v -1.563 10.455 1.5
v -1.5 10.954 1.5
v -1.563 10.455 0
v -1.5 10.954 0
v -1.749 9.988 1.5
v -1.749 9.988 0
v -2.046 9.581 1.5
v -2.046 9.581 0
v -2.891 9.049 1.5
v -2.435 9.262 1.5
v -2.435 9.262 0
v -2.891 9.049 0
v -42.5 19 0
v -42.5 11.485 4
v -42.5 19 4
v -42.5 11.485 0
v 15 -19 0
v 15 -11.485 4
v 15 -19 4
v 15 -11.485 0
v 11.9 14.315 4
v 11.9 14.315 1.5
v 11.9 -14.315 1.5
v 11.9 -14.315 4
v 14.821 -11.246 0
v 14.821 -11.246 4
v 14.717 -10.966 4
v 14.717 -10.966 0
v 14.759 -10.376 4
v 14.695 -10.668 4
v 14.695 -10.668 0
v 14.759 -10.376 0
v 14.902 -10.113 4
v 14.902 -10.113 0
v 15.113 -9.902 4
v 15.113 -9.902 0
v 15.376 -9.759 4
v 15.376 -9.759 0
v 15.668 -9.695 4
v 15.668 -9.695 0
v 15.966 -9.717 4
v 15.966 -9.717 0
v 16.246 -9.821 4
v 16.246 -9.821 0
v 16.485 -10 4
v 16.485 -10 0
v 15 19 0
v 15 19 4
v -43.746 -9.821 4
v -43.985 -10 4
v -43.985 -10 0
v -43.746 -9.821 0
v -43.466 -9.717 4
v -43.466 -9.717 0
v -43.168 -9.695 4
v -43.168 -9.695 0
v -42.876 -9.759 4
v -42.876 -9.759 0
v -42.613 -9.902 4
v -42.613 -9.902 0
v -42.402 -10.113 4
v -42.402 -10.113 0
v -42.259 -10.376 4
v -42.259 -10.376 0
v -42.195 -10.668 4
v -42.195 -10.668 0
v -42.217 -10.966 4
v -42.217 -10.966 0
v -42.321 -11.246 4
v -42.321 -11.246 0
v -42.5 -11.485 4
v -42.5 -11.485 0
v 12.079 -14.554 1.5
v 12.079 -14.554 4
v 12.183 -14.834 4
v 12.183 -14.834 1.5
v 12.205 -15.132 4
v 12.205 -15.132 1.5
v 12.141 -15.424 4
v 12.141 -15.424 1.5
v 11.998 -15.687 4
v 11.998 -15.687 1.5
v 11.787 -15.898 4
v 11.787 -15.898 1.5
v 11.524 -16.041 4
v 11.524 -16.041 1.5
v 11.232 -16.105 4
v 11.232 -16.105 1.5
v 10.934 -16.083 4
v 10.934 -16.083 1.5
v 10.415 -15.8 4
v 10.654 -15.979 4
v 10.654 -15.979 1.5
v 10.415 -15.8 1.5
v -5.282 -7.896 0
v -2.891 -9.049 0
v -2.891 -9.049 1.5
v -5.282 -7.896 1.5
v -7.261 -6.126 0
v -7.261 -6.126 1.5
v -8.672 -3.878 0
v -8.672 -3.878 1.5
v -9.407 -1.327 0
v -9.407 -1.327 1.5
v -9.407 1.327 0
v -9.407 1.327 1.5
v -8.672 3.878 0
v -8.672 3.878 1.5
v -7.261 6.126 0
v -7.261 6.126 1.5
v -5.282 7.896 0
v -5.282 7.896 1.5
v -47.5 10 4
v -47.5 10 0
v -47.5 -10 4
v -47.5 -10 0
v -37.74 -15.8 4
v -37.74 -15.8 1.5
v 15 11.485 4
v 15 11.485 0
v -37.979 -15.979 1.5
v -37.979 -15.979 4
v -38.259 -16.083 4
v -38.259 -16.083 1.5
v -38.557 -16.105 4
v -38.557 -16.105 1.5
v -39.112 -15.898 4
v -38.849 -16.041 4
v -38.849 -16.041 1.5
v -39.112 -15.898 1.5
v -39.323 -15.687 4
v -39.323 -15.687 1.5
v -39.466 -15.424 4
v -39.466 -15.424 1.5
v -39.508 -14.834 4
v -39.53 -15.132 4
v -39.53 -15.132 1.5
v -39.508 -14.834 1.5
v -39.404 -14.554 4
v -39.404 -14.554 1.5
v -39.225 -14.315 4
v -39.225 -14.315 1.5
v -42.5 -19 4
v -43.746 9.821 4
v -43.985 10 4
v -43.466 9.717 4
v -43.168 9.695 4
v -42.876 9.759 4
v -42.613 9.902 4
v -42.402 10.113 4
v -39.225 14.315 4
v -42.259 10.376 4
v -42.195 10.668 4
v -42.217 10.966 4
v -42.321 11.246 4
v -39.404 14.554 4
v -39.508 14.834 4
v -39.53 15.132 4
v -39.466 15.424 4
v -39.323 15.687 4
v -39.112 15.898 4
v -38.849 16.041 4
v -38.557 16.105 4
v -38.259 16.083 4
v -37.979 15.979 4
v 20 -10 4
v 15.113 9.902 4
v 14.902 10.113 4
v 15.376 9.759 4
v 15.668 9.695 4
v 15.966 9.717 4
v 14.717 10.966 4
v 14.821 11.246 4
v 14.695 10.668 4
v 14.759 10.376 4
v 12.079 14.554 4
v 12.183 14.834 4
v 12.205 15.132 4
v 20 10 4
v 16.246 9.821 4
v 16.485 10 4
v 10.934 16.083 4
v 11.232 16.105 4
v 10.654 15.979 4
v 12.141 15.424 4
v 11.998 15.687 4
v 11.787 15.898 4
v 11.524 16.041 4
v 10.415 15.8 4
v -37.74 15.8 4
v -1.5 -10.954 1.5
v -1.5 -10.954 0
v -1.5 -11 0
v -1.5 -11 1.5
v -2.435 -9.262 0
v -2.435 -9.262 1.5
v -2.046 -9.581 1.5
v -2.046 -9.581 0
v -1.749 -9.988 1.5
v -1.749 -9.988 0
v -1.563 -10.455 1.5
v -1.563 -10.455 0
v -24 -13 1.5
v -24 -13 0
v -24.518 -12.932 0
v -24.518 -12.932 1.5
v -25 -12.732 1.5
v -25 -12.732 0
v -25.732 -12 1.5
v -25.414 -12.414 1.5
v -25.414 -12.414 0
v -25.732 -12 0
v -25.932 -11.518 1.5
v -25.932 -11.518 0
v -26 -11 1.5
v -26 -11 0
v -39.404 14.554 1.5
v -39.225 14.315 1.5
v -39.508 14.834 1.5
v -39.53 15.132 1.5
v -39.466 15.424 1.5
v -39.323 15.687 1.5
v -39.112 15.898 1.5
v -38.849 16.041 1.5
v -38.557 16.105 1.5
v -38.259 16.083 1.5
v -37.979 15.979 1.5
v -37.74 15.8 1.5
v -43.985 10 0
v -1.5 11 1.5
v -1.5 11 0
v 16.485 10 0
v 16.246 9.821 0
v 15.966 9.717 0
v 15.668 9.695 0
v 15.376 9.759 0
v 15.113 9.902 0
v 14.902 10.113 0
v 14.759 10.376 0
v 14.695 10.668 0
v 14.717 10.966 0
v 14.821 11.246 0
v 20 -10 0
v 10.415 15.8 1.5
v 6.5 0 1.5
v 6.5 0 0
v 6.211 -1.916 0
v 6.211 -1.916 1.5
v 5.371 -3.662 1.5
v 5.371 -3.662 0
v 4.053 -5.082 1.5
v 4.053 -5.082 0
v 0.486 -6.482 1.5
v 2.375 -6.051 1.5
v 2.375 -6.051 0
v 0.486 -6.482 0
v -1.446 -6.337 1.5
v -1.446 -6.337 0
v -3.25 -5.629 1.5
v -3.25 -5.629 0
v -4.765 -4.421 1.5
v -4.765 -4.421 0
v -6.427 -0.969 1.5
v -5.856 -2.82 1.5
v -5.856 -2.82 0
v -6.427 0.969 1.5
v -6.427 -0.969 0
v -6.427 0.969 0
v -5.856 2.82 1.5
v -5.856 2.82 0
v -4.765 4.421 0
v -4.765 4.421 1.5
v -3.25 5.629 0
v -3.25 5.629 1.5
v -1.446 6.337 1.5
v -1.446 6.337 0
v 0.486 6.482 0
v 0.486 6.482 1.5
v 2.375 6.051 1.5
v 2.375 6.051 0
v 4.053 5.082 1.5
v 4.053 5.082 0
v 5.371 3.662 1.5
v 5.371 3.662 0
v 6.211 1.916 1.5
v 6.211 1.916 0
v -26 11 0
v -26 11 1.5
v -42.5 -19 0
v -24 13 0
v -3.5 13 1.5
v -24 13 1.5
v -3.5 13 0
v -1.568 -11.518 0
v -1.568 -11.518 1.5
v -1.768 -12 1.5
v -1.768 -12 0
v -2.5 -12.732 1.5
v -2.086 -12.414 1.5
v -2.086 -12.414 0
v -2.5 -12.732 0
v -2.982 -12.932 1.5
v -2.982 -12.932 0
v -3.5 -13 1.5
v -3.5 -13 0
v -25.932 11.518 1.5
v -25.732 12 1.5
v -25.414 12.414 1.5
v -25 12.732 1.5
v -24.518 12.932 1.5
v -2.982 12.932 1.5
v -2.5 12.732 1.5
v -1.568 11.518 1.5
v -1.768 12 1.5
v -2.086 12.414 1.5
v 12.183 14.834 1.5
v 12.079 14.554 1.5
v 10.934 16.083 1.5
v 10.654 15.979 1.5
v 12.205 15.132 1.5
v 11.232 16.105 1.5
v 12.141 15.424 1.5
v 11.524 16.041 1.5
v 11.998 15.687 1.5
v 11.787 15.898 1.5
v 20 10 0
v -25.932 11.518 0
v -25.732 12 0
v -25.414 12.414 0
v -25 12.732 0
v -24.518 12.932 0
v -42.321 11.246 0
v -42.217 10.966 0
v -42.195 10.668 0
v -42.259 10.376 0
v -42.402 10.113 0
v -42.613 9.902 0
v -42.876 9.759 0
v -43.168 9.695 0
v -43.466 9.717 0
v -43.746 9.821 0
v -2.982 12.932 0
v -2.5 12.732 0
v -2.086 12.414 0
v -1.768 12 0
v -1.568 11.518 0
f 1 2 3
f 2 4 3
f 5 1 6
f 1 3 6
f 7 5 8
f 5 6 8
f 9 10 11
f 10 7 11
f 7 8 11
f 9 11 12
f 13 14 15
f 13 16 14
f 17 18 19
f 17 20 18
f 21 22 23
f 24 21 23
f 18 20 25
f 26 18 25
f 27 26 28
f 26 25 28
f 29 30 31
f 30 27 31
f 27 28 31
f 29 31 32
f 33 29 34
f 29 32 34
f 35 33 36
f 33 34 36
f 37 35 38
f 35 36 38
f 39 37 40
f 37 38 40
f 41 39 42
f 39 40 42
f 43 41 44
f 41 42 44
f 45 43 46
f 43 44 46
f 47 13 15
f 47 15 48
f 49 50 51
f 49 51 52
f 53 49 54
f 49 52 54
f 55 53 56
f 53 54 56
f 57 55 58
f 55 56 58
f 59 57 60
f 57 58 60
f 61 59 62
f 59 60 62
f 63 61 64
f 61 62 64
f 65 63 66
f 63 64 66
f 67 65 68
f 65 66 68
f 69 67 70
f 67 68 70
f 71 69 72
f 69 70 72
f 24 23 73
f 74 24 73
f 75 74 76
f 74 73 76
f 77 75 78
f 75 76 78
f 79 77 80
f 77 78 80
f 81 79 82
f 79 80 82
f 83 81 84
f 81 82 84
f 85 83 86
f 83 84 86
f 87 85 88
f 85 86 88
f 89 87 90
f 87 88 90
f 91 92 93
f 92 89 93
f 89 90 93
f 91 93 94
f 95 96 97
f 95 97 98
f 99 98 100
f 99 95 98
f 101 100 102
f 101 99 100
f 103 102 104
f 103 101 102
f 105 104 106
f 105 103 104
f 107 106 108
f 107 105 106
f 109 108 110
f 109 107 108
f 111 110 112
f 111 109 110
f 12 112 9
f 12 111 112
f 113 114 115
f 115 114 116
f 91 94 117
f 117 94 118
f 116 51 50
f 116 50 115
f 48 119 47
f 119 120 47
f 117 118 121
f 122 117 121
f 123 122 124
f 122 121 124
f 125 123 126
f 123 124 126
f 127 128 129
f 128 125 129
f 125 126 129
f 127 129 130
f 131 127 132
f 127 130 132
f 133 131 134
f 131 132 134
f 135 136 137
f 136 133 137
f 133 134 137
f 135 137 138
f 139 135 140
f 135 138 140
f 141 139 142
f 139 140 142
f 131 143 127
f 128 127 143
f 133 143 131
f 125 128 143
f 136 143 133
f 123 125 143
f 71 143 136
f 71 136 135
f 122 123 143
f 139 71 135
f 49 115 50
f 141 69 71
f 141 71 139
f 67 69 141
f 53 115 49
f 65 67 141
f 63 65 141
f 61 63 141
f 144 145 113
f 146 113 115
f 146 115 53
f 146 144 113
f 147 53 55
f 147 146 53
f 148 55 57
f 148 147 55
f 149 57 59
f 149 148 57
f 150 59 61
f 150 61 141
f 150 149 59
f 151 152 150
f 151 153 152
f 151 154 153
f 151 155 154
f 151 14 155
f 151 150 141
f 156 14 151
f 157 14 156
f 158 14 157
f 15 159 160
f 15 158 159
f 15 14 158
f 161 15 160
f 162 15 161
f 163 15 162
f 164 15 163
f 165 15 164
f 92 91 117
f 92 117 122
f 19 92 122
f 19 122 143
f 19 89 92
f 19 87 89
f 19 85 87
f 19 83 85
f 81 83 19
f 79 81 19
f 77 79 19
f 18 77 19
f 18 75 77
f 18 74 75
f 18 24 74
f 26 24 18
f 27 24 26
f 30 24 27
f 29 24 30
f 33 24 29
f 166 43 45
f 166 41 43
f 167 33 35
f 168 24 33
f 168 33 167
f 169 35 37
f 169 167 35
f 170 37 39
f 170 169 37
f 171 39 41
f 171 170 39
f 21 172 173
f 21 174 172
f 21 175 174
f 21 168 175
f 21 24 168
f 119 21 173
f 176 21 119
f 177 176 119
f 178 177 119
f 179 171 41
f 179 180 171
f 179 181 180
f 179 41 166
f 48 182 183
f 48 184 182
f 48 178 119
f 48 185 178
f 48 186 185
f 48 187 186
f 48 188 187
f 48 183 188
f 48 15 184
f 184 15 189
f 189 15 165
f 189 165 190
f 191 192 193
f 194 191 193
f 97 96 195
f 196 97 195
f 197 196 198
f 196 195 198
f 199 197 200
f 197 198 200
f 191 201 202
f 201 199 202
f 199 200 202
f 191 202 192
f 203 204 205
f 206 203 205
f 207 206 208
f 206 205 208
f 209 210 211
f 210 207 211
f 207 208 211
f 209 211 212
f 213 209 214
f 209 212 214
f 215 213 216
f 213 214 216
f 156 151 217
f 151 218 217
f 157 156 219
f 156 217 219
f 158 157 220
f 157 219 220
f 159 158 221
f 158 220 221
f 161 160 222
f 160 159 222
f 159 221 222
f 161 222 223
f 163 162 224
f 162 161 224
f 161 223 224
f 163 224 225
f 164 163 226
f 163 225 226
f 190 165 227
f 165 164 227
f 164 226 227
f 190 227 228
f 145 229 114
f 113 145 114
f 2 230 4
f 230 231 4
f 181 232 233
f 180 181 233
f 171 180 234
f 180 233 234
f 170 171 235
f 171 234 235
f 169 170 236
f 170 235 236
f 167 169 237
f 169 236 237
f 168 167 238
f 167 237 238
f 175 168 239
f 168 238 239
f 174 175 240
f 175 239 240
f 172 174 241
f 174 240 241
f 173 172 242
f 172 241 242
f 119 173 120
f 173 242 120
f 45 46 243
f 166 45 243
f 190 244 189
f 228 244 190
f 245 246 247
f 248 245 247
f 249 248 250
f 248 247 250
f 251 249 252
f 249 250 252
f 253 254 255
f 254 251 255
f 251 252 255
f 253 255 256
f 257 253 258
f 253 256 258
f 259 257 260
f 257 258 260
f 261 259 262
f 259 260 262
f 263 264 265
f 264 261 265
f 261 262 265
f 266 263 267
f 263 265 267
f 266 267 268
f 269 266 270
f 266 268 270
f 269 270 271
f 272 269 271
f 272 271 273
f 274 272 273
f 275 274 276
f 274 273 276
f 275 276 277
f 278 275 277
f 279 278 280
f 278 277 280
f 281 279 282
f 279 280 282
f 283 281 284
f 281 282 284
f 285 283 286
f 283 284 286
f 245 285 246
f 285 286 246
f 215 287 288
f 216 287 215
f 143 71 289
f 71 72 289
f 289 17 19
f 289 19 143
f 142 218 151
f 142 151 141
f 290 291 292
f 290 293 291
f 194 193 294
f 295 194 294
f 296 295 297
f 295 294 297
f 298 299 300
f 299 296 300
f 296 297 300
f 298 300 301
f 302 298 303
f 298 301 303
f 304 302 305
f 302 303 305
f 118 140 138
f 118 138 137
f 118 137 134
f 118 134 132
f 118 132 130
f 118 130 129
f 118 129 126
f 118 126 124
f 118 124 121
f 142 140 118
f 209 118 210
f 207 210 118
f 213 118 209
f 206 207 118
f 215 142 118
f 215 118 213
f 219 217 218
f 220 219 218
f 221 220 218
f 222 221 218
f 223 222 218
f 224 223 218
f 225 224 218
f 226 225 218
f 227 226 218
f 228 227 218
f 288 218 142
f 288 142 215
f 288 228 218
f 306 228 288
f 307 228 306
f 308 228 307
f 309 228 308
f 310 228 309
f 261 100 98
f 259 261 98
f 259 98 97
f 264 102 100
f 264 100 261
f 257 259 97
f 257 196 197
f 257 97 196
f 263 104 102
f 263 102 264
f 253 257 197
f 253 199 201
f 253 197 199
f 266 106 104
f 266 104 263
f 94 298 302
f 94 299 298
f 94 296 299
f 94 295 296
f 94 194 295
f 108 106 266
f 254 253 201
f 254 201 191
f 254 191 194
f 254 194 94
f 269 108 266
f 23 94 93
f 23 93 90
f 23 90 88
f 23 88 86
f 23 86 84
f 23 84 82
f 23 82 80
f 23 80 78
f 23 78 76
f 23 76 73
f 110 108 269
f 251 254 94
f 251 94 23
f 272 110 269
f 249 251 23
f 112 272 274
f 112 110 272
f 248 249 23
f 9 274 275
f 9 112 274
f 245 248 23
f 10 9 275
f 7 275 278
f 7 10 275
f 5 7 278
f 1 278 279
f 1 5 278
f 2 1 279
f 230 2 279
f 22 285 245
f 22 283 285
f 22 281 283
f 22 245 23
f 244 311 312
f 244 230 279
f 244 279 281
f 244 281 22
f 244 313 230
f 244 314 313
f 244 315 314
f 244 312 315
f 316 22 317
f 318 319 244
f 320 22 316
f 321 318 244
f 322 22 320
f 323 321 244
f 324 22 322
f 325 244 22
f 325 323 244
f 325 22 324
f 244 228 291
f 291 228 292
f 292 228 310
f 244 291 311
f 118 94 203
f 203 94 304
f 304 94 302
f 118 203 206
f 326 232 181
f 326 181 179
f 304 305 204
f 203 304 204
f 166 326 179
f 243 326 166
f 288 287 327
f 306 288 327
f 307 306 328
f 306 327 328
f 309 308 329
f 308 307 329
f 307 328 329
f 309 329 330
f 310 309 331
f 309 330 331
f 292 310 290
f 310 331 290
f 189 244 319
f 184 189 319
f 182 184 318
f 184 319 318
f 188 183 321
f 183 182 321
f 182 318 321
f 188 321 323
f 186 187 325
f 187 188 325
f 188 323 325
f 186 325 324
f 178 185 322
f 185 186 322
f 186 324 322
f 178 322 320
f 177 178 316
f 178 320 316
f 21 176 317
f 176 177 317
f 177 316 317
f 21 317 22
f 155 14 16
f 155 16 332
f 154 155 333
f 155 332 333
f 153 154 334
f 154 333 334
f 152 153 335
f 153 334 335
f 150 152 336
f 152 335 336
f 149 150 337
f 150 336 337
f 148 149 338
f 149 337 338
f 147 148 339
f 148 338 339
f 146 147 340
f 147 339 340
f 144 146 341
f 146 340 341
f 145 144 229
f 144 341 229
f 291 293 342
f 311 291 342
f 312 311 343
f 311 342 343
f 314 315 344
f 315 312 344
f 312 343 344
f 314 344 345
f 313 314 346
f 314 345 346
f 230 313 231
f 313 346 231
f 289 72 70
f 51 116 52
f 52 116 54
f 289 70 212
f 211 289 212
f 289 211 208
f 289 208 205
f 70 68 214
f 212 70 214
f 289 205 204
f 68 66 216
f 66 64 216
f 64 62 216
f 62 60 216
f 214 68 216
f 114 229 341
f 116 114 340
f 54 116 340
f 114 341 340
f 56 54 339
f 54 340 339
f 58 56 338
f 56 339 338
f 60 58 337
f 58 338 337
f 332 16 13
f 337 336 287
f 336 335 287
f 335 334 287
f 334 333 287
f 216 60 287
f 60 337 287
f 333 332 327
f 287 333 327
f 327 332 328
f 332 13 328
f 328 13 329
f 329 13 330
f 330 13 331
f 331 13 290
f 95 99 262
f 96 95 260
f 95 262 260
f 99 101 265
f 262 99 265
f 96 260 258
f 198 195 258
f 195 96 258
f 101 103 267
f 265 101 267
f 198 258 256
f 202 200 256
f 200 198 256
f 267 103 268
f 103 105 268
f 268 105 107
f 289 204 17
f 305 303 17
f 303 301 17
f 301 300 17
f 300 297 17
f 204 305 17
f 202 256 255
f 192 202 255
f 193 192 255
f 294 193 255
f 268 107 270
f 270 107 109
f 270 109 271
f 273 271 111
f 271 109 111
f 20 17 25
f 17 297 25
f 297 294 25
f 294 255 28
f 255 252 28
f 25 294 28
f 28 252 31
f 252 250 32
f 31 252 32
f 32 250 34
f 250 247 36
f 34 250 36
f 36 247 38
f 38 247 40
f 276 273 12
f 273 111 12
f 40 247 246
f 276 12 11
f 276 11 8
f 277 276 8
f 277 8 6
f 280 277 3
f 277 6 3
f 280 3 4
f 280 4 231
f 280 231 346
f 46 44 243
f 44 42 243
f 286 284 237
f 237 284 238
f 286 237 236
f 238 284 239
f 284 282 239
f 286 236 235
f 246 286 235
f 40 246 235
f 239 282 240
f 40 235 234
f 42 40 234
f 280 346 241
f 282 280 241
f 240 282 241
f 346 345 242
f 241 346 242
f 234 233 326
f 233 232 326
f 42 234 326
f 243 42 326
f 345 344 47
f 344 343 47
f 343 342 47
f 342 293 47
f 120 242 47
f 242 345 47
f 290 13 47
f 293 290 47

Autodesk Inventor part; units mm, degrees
ref_plane "YZ Plane" through (0, 0, 0) normal (1, 0, 0) x (0, 1, 0)
ref_plane "XZ Plane" through (0, 0, 0) normal (0, 1, 0) x (-1, 0, 0)
ref_plane "XY Plane" through (0, 0, 0) normal (0, 0, 1) x (1, 0, 0)
sketch "スケッチ1" plane through (0, 0, 0) normal (0, 0, 1) x (1, 0, 0)
  line L0 (12, 16) -> (-29, 16) construction
  line L1 (-31, 14) -> (-31, -14) construction
  line L2 (-29, -16) -> (12, -16) construction
  line L3 (12, -16) -> (12, 16) construction
  line L4 (12, 16) -> (-31, -16) construction
  line L5 (-31, 16) -> (12, -16) construction
  line L6 (12, 0) -> (-31, 0) construction
  circle A0 centre (0, 0) radius 10.5 construction
  arc A1 (12, 10.583) -> (0, 16) centre (0, 0) ccw construction
  line L7 (-39.5, 14.4) -> (-39.5, -14.4) construction
  arc A2 (-29, 16) -> (-31, 14) centre (-29, 14) ccw construction
  arc A3 (-31, -14) -> (-29, -16) centre (-29, -14) ccw construction
  line L8 (-39.5, 14.4) -> (-30.9596, 14.4) construction
  line L9 (-39.5, -14.4) -> (-30.9596, -14.4) construction
  line L10 (-1, 13.5) -> (-28, 13.5) construction
  line L11 (-28, 13.5) -> (-28, -13.5) construction
  line L12 (-28, -13.5) -> (-1, -13.5) construction
  line L13 (-1, -13.5) -> (-1, 13.5) construction
  line L14 (-1, 13.5) -> (-28, -13.5) construction
  line L15 (-28, 13.5) -> (-1, -13.5) construction
  circle A4 centre (-1, 13.5) radius 1.35 construction
  circle A5 centre (-28, 13.5) radius 1.35 construction
  circle A6 centre (-1, -13.5) radius 1.35 construction
  circle A7 centre (-28, -13.5) radius 1.35 construction
  arc A8 (0, -16) -> (12, -10.583) centre (0, 0) ccw construction
  line L16 (11.9, 15.8) -> (11.9, 14.3151) construction
  line L17 (11.9, 15.8) -> (10.4151, 15.8) construction
  line L18 (-39.225, 15.8) -> (-39.225, 14.3151) construction
  arc A9 (-37.7401, 15.8) -> (-39.225, 14.3151) centre (-38.4825, 15.0575) ccw
  line L19 (11.9, -15.8) -> (10.4151, -15.8) construction
  arc A10 (-39.225, -14.3151) -> (-37.7401, -15.8) centre (-38.4825, -15.0575) ccw
  line L20 (-42.5, 19) -> (15, 19)
  line L21 (15, 19) -> (15, -19) construction
  line L22 (15, -19) -> (-42.5, -19)
  line L23 (-42.5, -19) -> (-42.5, 19) construction
  line L24 (-42.5, 19) -> (15, -19) construction
  line L25 (15, 19) -> (-42.5, -19) construction
  line L26 (15, 10) -> (16.4849, 10) construction
  line L27 (20, 10) -> (20, -10)
  line L28 (15, -10) -> (16.4849, -10) construction
  arc A11 (15, 11.4849) -> (16.4849, 10) centre (15.7425, 10.7425) ccw
  arc A12 (16.4849, -10) -> (15, -11.4849) centre (15.7425, -10.7425) ccw
  line L29 (-13.75, 19) -> (-13.75, -19) construction
  line L30 (15, 11.4849) -> (15, 19)
  line L31 (15, -11.4849) -> (15, -19)
  line L32 (-42.5, 10) -> (-43.9849, 10) construction
  line L33 (-47.5, 10) -> (-47.5, -10)
  line L34 (-42.5, -10) -> (-43.9849, -10) construction
  arc A13 (-43.9849, 10) -> (-42.5, 11.4849) centre (-43.2425, 10.7425) ccw
  arc A14 (-42.5, -11.4849) -> (-43.9849, -10) centre (-43.2425, -10.7425) ccw
  line L35 (-42.5, 11.4849) -> (-42.5, 19)
  line L36 (-42.5, -11.4849) -> (-42.5, -19)
  circle A15 centre (0, 0) radius 6 construction
  circle A16 centre (0, 0) radius 6.5
  line L37 (-3.5, 13) -> (-24, 13)
  line L38 (-26, 11) -> (-26, -11)
  line L39 (-3.5, -13) -> (-24, -13)
  arc A17 (-24, 13) -> (-26, 11) centre (-24, 11) ccw
  arc A18 (-26, -11) -> (-24, -13) centre (-24, -11) ccw
  line L40 (-1.5, 11) -> (-1.5, 10.9545)
  arc A19 (-2.8913, 9.0493) -> (-2.8913, -9.0493) centre (0, 0) ccw
  line L41 (-1.5, -10.9545) -> (-1.5, -11)
  arc A20 (-1.5, 11) -> (-3.5, 13) centre (-3.5, 11) ccw
  arc A21 (-3.5, -13) -> (-1.5, -11) centre (-3.5, -11) ccw
  arc A22 (-1.5, -10.9545) -> (-2.8913, -9.0493) centre (-3.5, -10.9545) ccw
  arc A23 (-2.8913, 9.0493) -> (-1.5, 10.9545) centre (-3.5, 10.9545) ccw
  arc A24 (11.9, 14.3151) -> (10.4151, 15.8) centre (11.1575, 15.0575) ccw
  arc A25 (10.4151, -15.8) -> (11.9, -14.3151) centre (11.1575, -15.0575) ccw
  line L42 (10.4151, 15.8) -> (-37.7401, 15.8)
  line L43 (11.9, 14.3151) -> (11.9, -14.3151)
  line L44 (10.4151, -15.8) -> (-37.7401, -15.8)
  line L45 (11.9, -14.3151) -> (11.9, -15.8) construction
  line L46 (-37.7401, -15.8) -> (-39.225, -15.8) construction
  line L47 (-39.225, -14.3151) -> (-39.225, -15.8) construction
  line L48 (-37.7401, 15.8) -> (-39.225, 15.8) construction
  line L49 (-39.225, 14.3151) -> (-39.225, -14.3151)
  line L50 (16.4849, 10) -> (20, 10)
  line L51 (16.4849, -10) -> (20, -10)
  line L52 (-43.9849, -10) -> (-47.5, -10)
  line L53 (-43.9849, 10) -> (-47.5, 10)
  point P0 (-9.5, 0)
  point P1 (-14.5, 0)
  point P2 (-13.75, 0)
  point P3 (-39.225, -14.3151)
  point P4 (-43.9849, -10)
  point P5 (-1.5, 13)
  point P6 (-26, 13)
  point P7 (-1.5, -13)
  point P8 (-26, -13)
  point P9 (-1.5, -13)
  point P10 (-1.5, 13)
  point P11 (-1.5, 9.3808)
  point P12 (-1.5, -9.3808)
  point P13 (11.9, -14.3151)
  point P14 (10.4151, -15.8)
  dimension "d0" = 43
  dimension "d1" = 32
  dimension "d2" = 21
  dimension "d3" = 16
  dimension "d4" = 9.5
  dimension "d5" = 28.8
  dimension "d7" = 2
  dimension "d8" = 8.5
  dimension "d9" = 27
  dimension "d10" = 27
  dimension "d11" = 8.5
  dimension "d12" = 2.7
  dimension "d13" = 2.7
  dimension "d23" = 3
  dimension "d24" = 3
  dimension "d26" = 5
  dimension "d27" = 20
  dimension "d29" = 1.05
  dimension "d34" = 12
  dimension "d35" = 13
  dimension "d36" = 38
  dimension "d39" = 5
  dimension "d40" = 2
  dimension "d43" = 3
  dimension "d44" = 3
  dimension "d45" = 1.5
  dimension "d46" = 2
  dimension "d47" = 2
  dimension "d54" = 51.125
  dimension "d55" = 0.1
  dimension "d57" = 31.6
  dimension "d58" = 2.1
  dimension "d59" = 2.1
extrude "押し出し1" add sketch "スケッチ1" along normal blind 4 contours L20 L30 A11 L50 L27 L51 A12 L31 L22 L36 A14 L52 L33 L53 A13 L35
extrude "押し出し2" add sketch "スケッチ1" along normal blind 1.5 contours L42 A24 L43 A25 L44 A10 L49 A9
equation "\"d13\" = d12"
equation "\"d24\" = d23"
equation "\"d29\" = d17"
equation "\"d39\" = d38"
equation "\"d38\" = d37"
equation "\"d17\" = 1.05"
equation "\"d37\" = 5"
properties part number "Trunk_servo_bottom_frame" material "アルミニウム 2014-T4"
